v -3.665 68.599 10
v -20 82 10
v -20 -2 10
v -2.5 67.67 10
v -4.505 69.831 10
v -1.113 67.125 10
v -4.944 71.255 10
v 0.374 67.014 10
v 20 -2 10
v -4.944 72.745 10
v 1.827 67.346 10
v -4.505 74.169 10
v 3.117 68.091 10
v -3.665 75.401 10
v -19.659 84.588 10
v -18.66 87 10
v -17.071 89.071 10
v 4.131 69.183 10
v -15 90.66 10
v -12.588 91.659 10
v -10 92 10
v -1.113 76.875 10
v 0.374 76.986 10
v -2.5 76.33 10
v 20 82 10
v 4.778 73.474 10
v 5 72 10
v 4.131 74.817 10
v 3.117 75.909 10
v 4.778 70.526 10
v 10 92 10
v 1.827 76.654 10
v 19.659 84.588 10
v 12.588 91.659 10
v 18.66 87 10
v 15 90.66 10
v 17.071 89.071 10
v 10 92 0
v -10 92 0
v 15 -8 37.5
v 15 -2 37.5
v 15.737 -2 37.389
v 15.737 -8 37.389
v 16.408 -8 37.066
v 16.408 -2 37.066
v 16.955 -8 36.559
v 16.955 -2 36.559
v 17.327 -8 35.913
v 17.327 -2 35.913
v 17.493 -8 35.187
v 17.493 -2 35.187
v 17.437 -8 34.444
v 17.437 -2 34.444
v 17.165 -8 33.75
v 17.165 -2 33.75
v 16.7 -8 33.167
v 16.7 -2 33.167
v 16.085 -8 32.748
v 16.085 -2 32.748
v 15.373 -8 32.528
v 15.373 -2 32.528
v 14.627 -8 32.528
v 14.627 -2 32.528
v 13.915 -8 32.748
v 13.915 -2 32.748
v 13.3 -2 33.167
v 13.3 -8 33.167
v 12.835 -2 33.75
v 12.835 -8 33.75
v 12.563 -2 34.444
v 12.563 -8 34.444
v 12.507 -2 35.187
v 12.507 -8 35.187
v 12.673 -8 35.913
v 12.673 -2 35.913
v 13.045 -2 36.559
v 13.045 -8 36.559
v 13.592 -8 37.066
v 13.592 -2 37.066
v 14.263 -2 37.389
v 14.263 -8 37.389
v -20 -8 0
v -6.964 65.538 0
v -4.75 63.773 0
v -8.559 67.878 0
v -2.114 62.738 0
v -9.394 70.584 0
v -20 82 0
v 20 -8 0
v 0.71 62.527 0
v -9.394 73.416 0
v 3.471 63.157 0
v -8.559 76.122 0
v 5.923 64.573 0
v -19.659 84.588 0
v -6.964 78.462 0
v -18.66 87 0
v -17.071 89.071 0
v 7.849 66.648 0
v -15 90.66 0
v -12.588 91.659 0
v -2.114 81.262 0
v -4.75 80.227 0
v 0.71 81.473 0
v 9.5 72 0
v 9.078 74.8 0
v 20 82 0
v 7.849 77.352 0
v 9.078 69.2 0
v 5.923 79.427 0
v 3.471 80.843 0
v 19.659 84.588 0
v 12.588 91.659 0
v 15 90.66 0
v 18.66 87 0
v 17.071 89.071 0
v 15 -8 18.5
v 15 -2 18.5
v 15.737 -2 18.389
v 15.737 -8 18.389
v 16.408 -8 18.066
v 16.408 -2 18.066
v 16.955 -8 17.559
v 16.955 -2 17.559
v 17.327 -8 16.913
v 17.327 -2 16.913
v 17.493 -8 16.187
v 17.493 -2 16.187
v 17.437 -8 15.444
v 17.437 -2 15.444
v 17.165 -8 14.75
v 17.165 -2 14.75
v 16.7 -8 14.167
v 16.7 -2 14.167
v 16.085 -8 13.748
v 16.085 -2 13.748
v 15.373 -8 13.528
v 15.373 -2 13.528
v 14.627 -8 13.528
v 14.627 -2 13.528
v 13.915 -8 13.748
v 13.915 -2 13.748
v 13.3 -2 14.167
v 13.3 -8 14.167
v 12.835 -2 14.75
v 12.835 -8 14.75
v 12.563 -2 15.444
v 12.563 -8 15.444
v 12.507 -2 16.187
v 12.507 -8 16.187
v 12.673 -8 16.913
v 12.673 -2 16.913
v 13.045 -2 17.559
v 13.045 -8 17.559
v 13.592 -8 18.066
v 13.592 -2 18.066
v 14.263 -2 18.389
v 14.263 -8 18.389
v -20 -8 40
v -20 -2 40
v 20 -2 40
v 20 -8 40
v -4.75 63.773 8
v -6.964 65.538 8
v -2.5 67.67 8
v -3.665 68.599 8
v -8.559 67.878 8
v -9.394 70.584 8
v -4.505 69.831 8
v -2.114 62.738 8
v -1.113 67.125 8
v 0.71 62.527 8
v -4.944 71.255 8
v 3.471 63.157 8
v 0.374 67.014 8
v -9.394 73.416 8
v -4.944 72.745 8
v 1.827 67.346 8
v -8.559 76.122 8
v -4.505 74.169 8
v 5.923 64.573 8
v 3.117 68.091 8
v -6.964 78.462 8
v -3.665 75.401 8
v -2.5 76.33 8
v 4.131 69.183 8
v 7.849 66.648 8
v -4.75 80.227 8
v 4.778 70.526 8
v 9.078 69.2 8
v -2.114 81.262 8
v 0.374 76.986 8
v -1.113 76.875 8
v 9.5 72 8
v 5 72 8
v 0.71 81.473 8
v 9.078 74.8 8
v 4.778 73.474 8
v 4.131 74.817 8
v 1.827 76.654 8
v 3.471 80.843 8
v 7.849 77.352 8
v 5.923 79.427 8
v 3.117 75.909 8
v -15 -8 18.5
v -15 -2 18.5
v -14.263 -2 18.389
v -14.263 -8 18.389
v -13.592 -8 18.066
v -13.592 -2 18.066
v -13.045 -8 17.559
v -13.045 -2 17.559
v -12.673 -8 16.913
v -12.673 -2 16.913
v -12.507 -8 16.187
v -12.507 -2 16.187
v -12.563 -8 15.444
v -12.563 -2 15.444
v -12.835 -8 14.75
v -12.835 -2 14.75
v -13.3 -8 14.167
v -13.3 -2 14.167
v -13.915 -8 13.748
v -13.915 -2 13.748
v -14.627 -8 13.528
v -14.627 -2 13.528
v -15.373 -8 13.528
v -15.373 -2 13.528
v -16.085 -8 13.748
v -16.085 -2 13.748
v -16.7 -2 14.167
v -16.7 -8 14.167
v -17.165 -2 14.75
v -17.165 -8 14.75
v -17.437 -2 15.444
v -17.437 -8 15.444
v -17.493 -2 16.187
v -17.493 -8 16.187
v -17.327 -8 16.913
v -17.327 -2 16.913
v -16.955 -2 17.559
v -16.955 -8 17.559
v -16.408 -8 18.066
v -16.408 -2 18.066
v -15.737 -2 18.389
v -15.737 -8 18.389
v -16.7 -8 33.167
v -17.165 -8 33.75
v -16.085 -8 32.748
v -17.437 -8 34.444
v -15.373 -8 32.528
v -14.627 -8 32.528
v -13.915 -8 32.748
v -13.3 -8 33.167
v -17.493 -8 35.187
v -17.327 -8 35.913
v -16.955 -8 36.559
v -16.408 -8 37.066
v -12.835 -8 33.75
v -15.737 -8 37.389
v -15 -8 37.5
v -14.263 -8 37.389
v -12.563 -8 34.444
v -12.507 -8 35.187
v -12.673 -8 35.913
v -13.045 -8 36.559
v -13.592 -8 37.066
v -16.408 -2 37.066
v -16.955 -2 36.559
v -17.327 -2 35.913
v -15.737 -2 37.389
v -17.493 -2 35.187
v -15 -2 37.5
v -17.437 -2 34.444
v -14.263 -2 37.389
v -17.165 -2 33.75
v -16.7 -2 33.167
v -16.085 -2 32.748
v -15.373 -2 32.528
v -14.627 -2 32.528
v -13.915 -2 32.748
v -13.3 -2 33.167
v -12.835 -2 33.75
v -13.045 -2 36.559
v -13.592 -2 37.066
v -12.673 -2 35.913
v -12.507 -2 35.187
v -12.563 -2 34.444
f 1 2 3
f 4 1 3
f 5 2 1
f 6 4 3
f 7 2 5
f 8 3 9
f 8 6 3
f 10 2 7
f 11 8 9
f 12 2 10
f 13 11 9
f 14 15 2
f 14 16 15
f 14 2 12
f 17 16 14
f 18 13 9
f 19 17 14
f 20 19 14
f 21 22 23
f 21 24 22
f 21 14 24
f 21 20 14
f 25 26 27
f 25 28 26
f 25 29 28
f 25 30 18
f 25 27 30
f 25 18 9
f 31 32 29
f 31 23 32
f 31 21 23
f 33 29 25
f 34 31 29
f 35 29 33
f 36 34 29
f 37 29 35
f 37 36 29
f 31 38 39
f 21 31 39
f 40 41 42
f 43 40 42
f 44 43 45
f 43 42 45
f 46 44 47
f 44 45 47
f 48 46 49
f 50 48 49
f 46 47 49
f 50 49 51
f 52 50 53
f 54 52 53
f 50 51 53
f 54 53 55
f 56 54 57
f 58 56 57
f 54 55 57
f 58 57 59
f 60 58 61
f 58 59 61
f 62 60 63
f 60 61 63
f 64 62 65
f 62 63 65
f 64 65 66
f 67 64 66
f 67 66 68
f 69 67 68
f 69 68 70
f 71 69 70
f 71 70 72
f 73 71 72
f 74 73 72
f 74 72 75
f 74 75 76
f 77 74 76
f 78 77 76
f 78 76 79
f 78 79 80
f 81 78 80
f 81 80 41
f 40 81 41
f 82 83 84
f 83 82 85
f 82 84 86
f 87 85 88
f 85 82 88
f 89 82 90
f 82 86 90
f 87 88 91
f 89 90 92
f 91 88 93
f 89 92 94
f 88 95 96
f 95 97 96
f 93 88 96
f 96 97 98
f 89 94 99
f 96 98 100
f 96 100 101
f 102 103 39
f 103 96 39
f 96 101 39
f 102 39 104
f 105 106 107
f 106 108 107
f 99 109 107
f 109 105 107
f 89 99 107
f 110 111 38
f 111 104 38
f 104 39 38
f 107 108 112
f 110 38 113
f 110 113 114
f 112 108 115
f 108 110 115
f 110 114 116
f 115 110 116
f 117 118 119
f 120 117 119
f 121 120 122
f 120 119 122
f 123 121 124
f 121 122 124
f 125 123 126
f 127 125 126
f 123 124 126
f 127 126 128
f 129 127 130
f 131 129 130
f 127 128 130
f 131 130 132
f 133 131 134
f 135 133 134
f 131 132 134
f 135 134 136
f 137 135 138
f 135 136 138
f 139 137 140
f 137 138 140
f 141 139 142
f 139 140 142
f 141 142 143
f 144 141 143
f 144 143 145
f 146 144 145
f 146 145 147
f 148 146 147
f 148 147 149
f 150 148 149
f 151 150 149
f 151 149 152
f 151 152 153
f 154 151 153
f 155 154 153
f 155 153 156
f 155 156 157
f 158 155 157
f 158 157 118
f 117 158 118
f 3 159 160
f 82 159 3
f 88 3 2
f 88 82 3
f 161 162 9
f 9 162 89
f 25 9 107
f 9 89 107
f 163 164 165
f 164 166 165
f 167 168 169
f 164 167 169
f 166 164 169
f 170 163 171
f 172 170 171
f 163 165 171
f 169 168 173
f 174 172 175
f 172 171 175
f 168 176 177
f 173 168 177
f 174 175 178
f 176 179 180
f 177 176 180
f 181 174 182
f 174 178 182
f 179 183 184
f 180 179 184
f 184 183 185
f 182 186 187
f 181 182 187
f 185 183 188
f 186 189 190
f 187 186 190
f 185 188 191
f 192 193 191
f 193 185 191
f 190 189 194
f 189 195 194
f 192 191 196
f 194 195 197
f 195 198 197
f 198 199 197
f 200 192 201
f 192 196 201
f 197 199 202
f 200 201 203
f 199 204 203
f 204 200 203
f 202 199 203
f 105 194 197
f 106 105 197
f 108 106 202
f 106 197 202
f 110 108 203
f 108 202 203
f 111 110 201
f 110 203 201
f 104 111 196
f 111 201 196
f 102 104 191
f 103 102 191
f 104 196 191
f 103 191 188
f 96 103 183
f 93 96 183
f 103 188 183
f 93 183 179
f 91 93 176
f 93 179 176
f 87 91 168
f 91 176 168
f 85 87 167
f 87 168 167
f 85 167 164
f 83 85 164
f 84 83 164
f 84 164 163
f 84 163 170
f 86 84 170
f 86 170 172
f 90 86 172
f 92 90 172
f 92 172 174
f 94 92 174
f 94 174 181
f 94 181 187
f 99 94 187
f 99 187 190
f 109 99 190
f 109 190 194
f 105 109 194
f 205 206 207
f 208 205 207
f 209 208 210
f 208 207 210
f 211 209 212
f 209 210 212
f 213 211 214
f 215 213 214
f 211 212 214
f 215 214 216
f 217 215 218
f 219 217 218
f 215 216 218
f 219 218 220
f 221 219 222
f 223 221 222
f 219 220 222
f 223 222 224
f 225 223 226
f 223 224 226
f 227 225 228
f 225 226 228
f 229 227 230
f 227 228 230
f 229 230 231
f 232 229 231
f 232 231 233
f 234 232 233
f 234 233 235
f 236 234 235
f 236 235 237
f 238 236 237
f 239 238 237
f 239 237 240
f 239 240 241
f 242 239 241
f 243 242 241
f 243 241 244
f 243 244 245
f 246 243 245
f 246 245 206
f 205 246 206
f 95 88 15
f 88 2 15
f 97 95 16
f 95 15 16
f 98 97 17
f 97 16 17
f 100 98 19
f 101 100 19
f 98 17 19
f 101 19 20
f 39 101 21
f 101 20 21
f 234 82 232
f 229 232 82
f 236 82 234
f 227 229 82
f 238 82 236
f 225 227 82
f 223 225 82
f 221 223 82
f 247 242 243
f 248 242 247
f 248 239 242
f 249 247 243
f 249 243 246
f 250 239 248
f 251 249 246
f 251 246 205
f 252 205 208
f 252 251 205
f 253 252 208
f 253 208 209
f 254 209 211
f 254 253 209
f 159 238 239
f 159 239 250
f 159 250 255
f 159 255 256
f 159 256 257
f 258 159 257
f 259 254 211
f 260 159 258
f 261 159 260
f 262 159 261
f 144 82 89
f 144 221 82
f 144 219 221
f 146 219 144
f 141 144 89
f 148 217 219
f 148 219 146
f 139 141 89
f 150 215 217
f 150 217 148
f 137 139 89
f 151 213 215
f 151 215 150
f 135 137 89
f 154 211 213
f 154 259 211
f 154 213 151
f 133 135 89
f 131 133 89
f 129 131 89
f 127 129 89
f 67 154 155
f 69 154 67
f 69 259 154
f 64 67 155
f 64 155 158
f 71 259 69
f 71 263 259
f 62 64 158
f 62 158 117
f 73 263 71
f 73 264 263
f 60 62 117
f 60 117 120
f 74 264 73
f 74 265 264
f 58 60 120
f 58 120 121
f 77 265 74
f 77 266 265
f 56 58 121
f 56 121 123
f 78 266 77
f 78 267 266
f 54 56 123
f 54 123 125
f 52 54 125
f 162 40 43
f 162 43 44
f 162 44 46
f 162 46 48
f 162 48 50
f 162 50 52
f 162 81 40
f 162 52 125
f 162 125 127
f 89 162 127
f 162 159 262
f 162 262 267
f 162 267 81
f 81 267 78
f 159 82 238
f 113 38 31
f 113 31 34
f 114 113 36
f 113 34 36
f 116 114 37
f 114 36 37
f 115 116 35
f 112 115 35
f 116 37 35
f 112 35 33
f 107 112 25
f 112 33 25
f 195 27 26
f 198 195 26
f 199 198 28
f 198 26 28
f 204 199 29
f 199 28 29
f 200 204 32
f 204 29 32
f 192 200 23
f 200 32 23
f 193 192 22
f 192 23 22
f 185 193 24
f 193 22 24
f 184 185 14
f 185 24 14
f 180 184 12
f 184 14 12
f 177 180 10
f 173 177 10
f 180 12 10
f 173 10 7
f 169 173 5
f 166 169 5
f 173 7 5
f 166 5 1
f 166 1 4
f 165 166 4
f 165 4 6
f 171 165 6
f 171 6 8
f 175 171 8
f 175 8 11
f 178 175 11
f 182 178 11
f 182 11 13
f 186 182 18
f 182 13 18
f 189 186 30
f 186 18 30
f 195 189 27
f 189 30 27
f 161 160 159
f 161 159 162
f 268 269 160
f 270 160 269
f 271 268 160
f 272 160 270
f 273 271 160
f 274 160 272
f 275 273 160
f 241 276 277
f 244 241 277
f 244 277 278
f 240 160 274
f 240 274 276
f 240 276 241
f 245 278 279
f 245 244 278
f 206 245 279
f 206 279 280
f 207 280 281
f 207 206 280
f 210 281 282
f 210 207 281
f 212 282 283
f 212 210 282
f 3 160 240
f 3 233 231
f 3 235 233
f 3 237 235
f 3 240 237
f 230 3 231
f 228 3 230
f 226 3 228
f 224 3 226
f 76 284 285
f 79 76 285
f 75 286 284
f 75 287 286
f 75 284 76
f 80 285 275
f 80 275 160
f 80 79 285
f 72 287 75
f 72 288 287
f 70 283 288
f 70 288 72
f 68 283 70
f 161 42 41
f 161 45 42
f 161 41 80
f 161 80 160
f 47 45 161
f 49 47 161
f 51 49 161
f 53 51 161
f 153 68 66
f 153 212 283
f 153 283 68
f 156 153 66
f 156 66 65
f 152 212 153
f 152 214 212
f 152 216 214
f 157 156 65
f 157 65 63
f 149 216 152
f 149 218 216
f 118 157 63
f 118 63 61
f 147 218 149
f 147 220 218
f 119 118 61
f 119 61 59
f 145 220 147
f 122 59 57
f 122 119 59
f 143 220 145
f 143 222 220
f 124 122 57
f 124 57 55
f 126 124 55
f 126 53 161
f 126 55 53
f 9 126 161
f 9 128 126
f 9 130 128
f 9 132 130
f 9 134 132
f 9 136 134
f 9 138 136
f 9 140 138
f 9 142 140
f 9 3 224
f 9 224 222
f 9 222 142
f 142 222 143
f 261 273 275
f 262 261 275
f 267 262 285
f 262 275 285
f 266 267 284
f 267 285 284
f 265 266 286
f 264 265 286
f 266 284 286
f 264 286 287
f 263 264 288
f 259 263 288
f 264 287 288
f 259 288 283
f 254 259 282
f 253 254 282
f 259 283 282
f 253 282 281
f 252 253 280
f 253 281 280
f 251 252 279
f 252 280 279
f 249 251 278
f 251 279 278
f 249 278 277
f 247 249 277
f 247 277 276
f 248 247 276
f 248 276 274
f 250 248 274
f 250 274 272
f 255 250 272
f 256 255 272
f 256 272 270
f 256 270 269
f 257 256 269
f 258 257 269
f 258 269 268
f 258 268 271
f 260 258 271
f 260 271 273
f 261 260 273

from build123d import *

# Parameters (mm, degrees)
SKETCH_1_W          = 40
SKETCH_1_H          = 30
EXTRUDE_1_DEPTH     = 10
SKETCH_2_W          = 20
SKETCH_2_H          = 5
CUT_EXTRUDE_1_DEPTH = 50
SKETCH_3_W          = 40
SKETCH_3_H          = 8
EXTRUDE_2_DEPTH     = 30
SKETCH_4_W          = 40
SKETCH_4_H          = 2
CUT_EXTRUDE_2_DEPTH = 48.16990566
SKETCH_5_R          = 2.5
CUT_EXTRUDE_3_DEPTH = 15
SKETCH_7_R          = 2.5
CUT_EXTRUDE_4_DEPTH = 15
SKETCH_8_W          = 40
SKETCH_8_H          = 100
EXTRUDE_3_DEPTH     = 10
SKETCH_9_R          = 5
CUT_EXTRUDE_5_DEPTH = 103.29369482
FILLET_1_R          = 10
SKETCH_13_R         = 9.5
CUT_EXTRUDE_8_DEPTH = 99.812954616
SKETCH_14_R         = 9.5
SKETCH_14_R_2       = 5
EXTRUDE_5_DEPTH     = 2


with BuildPart() as part:
    # 草图1 → 凸台-拉伸1 (new body)
    with BuildSketch(Plane.XY):
        Rectangle(SKETCH_1_W, SKETCH_1_H)
    extrude(amount=EXTRUDE_1_DEPTH)

    # 草图2 → 切除-拉伸1 (cut)
    with BuildSketch(Plane.XY.offset(10)):
        with BuildLine():
            ThreePointArc((-20, 12.5), (-19.267766953, 14.267766953), (-17.5, 15))
            Line((-17.5, 15), (-20, 15))
            Line((-20, 15), (-20, 12.5))
        make_face()
        with BuildLine():
            ThreePointArc((5, 5), (3.535533906, 8.535533906), (0, 10))
            Line((0, 10), (0, 0))
            ThreePointArc((0, 0), (3.535533906, 1.464466094), (5, 5))
        make_face()
        with BuildLine():
            Line((0, 0), (0, 10))
            ThreePointArc((0, 10), (-5, 5), (0, 0))
        make_face()
        with BuildLine():
            Line((20, 15), (17.5, 15))
            ThreePointArc((17.5, 15), (19.267766953, 14.267766953), (20, 12.5))
            Line((20, 12.5), (20, 15))
        make_face()
        with Locations((10, -12.5)):
            Rectangle(SKETCH_2_W, SKETCH_2_H)
        with Locations((-10, -12.5)):
            Rectangle(SKETCH_2_W, SKETCH_2_H)
    extrude(amount=-CUT_EXTRUDE_1_DEPTH, mode=Mode.SUBTRACT)

    # 草图3 → 凸台-拉伸2 (add)
    with BuildSketch(Plane.XY.offset(10)):
        with Locations((0, -6)):
            Rectangle(SKETCH_3_W, SKETCH_3_H)
    extrude(amount=EXTRUDE_2_DEPTH)

    # 草图4 → 切除-拉伸2 (cut, through all)
    with BuildSketch(Plane.XY.offset(40)):
        with Locations((0, -9)):
            Rectangle(SKETCH_4_W, SKETCH_4_H)
    extrude(amount=-CUT_EXTRUDE_2_DEPTH, mode=Mode.SUBTRACT)

    # 草图5 → 切除-拉伸3 (cut)
    with BuildSketch(Plane(origin=(0, -2, 0), x_dir=(1, 0, 0), z_dir=(0, 1, 0))):
        with Locations(Location((-15, -35, 0), (0, 0, 270))):
            Circle(SKETCH_5_R)
        with Locations(Location((15, -35, 0), (0, 0, 270))):
            Circle(SKETCH_5_R)
    extrude(amount=-CUT_EXTRUDE_3_DEPTH, mode=Mode.SUBTRACT)

    # 草图7 → 切除-拉伸4 (cut)
    with BuildSketch(Plane(origin=(0, -2, 0), x_dir=(1, 0, 0), z_dir=(0, 1, 0))):
        with Locations(Location((-15, -16, 0), (0, 0, 270))):
            Circle(SKETCH_7_R)
        with Locations(Location((15, -16, 0), (0, 0, 270))):
            Circle(SKETCH_7_R)
    extrude(amount=-CUT_EXTRUDE_4_DEPTH, mode=Mode.SUBTRACT)

    # 草图8 → 凸台-拉伸3 (add)
    with BuildSketch(Plane(origin=(0, 0, 0), x_dir=(-1, 0, 0), z_dir=(0, 0, -1))):
        with Locations((0, 42)):
            Rectangle(SKETCH_8_W, SKETCH_8_H)
    extrude(amount=-EXTRUDE_3_DEPTH)

    # 草图9 → 切除-拉伸5 (cut, through all)
    with BuildSketch(Plane(origin=(0, 0, 0), x_dir=(-1, 0, 0), z_dir=(0, 0, -1))):
        with Locations((0, 72)):
            Circle(SKETCH_9_R)
    extrude(amount=-CUT_EXTRUDE_5_DEPTH, mode=Mode.SUBTRACT)

    # 圆角1
    fillet_1_edges = [part.edges().sort_by_distance(p)[0] for p in [
        (-20, 92, 5),
        (20, 92, 5),
    ]]
    fillet(fillet_1_edges, radius=FILLET_1_R)

    # 草图13 → 切除-拉伸8 (cut, through all)
    with BuildSketch(Plane.XY.offset(10)):
        with Locations((0, 72)):
            Circle(SKETCH_13_R)
    extrude(amount=-CUT_EXTRUDE_8_DEPTH, mode=Mode.SUBTRACT)

    # 草图14 → 凸台-拉伸5 (add)
    with BuildSketch(Plane.XY.offset(10)):
        with Locations((0, 72)):
            Circle(SKETCH_14_R)
        with Locations((0, 72)):
            Circle(SKETCH_14_R_2, mode=Mode.SUBTRACT)
    extrude(amount=-EXTRUDE_5_DEPTH)


solid = part.part
